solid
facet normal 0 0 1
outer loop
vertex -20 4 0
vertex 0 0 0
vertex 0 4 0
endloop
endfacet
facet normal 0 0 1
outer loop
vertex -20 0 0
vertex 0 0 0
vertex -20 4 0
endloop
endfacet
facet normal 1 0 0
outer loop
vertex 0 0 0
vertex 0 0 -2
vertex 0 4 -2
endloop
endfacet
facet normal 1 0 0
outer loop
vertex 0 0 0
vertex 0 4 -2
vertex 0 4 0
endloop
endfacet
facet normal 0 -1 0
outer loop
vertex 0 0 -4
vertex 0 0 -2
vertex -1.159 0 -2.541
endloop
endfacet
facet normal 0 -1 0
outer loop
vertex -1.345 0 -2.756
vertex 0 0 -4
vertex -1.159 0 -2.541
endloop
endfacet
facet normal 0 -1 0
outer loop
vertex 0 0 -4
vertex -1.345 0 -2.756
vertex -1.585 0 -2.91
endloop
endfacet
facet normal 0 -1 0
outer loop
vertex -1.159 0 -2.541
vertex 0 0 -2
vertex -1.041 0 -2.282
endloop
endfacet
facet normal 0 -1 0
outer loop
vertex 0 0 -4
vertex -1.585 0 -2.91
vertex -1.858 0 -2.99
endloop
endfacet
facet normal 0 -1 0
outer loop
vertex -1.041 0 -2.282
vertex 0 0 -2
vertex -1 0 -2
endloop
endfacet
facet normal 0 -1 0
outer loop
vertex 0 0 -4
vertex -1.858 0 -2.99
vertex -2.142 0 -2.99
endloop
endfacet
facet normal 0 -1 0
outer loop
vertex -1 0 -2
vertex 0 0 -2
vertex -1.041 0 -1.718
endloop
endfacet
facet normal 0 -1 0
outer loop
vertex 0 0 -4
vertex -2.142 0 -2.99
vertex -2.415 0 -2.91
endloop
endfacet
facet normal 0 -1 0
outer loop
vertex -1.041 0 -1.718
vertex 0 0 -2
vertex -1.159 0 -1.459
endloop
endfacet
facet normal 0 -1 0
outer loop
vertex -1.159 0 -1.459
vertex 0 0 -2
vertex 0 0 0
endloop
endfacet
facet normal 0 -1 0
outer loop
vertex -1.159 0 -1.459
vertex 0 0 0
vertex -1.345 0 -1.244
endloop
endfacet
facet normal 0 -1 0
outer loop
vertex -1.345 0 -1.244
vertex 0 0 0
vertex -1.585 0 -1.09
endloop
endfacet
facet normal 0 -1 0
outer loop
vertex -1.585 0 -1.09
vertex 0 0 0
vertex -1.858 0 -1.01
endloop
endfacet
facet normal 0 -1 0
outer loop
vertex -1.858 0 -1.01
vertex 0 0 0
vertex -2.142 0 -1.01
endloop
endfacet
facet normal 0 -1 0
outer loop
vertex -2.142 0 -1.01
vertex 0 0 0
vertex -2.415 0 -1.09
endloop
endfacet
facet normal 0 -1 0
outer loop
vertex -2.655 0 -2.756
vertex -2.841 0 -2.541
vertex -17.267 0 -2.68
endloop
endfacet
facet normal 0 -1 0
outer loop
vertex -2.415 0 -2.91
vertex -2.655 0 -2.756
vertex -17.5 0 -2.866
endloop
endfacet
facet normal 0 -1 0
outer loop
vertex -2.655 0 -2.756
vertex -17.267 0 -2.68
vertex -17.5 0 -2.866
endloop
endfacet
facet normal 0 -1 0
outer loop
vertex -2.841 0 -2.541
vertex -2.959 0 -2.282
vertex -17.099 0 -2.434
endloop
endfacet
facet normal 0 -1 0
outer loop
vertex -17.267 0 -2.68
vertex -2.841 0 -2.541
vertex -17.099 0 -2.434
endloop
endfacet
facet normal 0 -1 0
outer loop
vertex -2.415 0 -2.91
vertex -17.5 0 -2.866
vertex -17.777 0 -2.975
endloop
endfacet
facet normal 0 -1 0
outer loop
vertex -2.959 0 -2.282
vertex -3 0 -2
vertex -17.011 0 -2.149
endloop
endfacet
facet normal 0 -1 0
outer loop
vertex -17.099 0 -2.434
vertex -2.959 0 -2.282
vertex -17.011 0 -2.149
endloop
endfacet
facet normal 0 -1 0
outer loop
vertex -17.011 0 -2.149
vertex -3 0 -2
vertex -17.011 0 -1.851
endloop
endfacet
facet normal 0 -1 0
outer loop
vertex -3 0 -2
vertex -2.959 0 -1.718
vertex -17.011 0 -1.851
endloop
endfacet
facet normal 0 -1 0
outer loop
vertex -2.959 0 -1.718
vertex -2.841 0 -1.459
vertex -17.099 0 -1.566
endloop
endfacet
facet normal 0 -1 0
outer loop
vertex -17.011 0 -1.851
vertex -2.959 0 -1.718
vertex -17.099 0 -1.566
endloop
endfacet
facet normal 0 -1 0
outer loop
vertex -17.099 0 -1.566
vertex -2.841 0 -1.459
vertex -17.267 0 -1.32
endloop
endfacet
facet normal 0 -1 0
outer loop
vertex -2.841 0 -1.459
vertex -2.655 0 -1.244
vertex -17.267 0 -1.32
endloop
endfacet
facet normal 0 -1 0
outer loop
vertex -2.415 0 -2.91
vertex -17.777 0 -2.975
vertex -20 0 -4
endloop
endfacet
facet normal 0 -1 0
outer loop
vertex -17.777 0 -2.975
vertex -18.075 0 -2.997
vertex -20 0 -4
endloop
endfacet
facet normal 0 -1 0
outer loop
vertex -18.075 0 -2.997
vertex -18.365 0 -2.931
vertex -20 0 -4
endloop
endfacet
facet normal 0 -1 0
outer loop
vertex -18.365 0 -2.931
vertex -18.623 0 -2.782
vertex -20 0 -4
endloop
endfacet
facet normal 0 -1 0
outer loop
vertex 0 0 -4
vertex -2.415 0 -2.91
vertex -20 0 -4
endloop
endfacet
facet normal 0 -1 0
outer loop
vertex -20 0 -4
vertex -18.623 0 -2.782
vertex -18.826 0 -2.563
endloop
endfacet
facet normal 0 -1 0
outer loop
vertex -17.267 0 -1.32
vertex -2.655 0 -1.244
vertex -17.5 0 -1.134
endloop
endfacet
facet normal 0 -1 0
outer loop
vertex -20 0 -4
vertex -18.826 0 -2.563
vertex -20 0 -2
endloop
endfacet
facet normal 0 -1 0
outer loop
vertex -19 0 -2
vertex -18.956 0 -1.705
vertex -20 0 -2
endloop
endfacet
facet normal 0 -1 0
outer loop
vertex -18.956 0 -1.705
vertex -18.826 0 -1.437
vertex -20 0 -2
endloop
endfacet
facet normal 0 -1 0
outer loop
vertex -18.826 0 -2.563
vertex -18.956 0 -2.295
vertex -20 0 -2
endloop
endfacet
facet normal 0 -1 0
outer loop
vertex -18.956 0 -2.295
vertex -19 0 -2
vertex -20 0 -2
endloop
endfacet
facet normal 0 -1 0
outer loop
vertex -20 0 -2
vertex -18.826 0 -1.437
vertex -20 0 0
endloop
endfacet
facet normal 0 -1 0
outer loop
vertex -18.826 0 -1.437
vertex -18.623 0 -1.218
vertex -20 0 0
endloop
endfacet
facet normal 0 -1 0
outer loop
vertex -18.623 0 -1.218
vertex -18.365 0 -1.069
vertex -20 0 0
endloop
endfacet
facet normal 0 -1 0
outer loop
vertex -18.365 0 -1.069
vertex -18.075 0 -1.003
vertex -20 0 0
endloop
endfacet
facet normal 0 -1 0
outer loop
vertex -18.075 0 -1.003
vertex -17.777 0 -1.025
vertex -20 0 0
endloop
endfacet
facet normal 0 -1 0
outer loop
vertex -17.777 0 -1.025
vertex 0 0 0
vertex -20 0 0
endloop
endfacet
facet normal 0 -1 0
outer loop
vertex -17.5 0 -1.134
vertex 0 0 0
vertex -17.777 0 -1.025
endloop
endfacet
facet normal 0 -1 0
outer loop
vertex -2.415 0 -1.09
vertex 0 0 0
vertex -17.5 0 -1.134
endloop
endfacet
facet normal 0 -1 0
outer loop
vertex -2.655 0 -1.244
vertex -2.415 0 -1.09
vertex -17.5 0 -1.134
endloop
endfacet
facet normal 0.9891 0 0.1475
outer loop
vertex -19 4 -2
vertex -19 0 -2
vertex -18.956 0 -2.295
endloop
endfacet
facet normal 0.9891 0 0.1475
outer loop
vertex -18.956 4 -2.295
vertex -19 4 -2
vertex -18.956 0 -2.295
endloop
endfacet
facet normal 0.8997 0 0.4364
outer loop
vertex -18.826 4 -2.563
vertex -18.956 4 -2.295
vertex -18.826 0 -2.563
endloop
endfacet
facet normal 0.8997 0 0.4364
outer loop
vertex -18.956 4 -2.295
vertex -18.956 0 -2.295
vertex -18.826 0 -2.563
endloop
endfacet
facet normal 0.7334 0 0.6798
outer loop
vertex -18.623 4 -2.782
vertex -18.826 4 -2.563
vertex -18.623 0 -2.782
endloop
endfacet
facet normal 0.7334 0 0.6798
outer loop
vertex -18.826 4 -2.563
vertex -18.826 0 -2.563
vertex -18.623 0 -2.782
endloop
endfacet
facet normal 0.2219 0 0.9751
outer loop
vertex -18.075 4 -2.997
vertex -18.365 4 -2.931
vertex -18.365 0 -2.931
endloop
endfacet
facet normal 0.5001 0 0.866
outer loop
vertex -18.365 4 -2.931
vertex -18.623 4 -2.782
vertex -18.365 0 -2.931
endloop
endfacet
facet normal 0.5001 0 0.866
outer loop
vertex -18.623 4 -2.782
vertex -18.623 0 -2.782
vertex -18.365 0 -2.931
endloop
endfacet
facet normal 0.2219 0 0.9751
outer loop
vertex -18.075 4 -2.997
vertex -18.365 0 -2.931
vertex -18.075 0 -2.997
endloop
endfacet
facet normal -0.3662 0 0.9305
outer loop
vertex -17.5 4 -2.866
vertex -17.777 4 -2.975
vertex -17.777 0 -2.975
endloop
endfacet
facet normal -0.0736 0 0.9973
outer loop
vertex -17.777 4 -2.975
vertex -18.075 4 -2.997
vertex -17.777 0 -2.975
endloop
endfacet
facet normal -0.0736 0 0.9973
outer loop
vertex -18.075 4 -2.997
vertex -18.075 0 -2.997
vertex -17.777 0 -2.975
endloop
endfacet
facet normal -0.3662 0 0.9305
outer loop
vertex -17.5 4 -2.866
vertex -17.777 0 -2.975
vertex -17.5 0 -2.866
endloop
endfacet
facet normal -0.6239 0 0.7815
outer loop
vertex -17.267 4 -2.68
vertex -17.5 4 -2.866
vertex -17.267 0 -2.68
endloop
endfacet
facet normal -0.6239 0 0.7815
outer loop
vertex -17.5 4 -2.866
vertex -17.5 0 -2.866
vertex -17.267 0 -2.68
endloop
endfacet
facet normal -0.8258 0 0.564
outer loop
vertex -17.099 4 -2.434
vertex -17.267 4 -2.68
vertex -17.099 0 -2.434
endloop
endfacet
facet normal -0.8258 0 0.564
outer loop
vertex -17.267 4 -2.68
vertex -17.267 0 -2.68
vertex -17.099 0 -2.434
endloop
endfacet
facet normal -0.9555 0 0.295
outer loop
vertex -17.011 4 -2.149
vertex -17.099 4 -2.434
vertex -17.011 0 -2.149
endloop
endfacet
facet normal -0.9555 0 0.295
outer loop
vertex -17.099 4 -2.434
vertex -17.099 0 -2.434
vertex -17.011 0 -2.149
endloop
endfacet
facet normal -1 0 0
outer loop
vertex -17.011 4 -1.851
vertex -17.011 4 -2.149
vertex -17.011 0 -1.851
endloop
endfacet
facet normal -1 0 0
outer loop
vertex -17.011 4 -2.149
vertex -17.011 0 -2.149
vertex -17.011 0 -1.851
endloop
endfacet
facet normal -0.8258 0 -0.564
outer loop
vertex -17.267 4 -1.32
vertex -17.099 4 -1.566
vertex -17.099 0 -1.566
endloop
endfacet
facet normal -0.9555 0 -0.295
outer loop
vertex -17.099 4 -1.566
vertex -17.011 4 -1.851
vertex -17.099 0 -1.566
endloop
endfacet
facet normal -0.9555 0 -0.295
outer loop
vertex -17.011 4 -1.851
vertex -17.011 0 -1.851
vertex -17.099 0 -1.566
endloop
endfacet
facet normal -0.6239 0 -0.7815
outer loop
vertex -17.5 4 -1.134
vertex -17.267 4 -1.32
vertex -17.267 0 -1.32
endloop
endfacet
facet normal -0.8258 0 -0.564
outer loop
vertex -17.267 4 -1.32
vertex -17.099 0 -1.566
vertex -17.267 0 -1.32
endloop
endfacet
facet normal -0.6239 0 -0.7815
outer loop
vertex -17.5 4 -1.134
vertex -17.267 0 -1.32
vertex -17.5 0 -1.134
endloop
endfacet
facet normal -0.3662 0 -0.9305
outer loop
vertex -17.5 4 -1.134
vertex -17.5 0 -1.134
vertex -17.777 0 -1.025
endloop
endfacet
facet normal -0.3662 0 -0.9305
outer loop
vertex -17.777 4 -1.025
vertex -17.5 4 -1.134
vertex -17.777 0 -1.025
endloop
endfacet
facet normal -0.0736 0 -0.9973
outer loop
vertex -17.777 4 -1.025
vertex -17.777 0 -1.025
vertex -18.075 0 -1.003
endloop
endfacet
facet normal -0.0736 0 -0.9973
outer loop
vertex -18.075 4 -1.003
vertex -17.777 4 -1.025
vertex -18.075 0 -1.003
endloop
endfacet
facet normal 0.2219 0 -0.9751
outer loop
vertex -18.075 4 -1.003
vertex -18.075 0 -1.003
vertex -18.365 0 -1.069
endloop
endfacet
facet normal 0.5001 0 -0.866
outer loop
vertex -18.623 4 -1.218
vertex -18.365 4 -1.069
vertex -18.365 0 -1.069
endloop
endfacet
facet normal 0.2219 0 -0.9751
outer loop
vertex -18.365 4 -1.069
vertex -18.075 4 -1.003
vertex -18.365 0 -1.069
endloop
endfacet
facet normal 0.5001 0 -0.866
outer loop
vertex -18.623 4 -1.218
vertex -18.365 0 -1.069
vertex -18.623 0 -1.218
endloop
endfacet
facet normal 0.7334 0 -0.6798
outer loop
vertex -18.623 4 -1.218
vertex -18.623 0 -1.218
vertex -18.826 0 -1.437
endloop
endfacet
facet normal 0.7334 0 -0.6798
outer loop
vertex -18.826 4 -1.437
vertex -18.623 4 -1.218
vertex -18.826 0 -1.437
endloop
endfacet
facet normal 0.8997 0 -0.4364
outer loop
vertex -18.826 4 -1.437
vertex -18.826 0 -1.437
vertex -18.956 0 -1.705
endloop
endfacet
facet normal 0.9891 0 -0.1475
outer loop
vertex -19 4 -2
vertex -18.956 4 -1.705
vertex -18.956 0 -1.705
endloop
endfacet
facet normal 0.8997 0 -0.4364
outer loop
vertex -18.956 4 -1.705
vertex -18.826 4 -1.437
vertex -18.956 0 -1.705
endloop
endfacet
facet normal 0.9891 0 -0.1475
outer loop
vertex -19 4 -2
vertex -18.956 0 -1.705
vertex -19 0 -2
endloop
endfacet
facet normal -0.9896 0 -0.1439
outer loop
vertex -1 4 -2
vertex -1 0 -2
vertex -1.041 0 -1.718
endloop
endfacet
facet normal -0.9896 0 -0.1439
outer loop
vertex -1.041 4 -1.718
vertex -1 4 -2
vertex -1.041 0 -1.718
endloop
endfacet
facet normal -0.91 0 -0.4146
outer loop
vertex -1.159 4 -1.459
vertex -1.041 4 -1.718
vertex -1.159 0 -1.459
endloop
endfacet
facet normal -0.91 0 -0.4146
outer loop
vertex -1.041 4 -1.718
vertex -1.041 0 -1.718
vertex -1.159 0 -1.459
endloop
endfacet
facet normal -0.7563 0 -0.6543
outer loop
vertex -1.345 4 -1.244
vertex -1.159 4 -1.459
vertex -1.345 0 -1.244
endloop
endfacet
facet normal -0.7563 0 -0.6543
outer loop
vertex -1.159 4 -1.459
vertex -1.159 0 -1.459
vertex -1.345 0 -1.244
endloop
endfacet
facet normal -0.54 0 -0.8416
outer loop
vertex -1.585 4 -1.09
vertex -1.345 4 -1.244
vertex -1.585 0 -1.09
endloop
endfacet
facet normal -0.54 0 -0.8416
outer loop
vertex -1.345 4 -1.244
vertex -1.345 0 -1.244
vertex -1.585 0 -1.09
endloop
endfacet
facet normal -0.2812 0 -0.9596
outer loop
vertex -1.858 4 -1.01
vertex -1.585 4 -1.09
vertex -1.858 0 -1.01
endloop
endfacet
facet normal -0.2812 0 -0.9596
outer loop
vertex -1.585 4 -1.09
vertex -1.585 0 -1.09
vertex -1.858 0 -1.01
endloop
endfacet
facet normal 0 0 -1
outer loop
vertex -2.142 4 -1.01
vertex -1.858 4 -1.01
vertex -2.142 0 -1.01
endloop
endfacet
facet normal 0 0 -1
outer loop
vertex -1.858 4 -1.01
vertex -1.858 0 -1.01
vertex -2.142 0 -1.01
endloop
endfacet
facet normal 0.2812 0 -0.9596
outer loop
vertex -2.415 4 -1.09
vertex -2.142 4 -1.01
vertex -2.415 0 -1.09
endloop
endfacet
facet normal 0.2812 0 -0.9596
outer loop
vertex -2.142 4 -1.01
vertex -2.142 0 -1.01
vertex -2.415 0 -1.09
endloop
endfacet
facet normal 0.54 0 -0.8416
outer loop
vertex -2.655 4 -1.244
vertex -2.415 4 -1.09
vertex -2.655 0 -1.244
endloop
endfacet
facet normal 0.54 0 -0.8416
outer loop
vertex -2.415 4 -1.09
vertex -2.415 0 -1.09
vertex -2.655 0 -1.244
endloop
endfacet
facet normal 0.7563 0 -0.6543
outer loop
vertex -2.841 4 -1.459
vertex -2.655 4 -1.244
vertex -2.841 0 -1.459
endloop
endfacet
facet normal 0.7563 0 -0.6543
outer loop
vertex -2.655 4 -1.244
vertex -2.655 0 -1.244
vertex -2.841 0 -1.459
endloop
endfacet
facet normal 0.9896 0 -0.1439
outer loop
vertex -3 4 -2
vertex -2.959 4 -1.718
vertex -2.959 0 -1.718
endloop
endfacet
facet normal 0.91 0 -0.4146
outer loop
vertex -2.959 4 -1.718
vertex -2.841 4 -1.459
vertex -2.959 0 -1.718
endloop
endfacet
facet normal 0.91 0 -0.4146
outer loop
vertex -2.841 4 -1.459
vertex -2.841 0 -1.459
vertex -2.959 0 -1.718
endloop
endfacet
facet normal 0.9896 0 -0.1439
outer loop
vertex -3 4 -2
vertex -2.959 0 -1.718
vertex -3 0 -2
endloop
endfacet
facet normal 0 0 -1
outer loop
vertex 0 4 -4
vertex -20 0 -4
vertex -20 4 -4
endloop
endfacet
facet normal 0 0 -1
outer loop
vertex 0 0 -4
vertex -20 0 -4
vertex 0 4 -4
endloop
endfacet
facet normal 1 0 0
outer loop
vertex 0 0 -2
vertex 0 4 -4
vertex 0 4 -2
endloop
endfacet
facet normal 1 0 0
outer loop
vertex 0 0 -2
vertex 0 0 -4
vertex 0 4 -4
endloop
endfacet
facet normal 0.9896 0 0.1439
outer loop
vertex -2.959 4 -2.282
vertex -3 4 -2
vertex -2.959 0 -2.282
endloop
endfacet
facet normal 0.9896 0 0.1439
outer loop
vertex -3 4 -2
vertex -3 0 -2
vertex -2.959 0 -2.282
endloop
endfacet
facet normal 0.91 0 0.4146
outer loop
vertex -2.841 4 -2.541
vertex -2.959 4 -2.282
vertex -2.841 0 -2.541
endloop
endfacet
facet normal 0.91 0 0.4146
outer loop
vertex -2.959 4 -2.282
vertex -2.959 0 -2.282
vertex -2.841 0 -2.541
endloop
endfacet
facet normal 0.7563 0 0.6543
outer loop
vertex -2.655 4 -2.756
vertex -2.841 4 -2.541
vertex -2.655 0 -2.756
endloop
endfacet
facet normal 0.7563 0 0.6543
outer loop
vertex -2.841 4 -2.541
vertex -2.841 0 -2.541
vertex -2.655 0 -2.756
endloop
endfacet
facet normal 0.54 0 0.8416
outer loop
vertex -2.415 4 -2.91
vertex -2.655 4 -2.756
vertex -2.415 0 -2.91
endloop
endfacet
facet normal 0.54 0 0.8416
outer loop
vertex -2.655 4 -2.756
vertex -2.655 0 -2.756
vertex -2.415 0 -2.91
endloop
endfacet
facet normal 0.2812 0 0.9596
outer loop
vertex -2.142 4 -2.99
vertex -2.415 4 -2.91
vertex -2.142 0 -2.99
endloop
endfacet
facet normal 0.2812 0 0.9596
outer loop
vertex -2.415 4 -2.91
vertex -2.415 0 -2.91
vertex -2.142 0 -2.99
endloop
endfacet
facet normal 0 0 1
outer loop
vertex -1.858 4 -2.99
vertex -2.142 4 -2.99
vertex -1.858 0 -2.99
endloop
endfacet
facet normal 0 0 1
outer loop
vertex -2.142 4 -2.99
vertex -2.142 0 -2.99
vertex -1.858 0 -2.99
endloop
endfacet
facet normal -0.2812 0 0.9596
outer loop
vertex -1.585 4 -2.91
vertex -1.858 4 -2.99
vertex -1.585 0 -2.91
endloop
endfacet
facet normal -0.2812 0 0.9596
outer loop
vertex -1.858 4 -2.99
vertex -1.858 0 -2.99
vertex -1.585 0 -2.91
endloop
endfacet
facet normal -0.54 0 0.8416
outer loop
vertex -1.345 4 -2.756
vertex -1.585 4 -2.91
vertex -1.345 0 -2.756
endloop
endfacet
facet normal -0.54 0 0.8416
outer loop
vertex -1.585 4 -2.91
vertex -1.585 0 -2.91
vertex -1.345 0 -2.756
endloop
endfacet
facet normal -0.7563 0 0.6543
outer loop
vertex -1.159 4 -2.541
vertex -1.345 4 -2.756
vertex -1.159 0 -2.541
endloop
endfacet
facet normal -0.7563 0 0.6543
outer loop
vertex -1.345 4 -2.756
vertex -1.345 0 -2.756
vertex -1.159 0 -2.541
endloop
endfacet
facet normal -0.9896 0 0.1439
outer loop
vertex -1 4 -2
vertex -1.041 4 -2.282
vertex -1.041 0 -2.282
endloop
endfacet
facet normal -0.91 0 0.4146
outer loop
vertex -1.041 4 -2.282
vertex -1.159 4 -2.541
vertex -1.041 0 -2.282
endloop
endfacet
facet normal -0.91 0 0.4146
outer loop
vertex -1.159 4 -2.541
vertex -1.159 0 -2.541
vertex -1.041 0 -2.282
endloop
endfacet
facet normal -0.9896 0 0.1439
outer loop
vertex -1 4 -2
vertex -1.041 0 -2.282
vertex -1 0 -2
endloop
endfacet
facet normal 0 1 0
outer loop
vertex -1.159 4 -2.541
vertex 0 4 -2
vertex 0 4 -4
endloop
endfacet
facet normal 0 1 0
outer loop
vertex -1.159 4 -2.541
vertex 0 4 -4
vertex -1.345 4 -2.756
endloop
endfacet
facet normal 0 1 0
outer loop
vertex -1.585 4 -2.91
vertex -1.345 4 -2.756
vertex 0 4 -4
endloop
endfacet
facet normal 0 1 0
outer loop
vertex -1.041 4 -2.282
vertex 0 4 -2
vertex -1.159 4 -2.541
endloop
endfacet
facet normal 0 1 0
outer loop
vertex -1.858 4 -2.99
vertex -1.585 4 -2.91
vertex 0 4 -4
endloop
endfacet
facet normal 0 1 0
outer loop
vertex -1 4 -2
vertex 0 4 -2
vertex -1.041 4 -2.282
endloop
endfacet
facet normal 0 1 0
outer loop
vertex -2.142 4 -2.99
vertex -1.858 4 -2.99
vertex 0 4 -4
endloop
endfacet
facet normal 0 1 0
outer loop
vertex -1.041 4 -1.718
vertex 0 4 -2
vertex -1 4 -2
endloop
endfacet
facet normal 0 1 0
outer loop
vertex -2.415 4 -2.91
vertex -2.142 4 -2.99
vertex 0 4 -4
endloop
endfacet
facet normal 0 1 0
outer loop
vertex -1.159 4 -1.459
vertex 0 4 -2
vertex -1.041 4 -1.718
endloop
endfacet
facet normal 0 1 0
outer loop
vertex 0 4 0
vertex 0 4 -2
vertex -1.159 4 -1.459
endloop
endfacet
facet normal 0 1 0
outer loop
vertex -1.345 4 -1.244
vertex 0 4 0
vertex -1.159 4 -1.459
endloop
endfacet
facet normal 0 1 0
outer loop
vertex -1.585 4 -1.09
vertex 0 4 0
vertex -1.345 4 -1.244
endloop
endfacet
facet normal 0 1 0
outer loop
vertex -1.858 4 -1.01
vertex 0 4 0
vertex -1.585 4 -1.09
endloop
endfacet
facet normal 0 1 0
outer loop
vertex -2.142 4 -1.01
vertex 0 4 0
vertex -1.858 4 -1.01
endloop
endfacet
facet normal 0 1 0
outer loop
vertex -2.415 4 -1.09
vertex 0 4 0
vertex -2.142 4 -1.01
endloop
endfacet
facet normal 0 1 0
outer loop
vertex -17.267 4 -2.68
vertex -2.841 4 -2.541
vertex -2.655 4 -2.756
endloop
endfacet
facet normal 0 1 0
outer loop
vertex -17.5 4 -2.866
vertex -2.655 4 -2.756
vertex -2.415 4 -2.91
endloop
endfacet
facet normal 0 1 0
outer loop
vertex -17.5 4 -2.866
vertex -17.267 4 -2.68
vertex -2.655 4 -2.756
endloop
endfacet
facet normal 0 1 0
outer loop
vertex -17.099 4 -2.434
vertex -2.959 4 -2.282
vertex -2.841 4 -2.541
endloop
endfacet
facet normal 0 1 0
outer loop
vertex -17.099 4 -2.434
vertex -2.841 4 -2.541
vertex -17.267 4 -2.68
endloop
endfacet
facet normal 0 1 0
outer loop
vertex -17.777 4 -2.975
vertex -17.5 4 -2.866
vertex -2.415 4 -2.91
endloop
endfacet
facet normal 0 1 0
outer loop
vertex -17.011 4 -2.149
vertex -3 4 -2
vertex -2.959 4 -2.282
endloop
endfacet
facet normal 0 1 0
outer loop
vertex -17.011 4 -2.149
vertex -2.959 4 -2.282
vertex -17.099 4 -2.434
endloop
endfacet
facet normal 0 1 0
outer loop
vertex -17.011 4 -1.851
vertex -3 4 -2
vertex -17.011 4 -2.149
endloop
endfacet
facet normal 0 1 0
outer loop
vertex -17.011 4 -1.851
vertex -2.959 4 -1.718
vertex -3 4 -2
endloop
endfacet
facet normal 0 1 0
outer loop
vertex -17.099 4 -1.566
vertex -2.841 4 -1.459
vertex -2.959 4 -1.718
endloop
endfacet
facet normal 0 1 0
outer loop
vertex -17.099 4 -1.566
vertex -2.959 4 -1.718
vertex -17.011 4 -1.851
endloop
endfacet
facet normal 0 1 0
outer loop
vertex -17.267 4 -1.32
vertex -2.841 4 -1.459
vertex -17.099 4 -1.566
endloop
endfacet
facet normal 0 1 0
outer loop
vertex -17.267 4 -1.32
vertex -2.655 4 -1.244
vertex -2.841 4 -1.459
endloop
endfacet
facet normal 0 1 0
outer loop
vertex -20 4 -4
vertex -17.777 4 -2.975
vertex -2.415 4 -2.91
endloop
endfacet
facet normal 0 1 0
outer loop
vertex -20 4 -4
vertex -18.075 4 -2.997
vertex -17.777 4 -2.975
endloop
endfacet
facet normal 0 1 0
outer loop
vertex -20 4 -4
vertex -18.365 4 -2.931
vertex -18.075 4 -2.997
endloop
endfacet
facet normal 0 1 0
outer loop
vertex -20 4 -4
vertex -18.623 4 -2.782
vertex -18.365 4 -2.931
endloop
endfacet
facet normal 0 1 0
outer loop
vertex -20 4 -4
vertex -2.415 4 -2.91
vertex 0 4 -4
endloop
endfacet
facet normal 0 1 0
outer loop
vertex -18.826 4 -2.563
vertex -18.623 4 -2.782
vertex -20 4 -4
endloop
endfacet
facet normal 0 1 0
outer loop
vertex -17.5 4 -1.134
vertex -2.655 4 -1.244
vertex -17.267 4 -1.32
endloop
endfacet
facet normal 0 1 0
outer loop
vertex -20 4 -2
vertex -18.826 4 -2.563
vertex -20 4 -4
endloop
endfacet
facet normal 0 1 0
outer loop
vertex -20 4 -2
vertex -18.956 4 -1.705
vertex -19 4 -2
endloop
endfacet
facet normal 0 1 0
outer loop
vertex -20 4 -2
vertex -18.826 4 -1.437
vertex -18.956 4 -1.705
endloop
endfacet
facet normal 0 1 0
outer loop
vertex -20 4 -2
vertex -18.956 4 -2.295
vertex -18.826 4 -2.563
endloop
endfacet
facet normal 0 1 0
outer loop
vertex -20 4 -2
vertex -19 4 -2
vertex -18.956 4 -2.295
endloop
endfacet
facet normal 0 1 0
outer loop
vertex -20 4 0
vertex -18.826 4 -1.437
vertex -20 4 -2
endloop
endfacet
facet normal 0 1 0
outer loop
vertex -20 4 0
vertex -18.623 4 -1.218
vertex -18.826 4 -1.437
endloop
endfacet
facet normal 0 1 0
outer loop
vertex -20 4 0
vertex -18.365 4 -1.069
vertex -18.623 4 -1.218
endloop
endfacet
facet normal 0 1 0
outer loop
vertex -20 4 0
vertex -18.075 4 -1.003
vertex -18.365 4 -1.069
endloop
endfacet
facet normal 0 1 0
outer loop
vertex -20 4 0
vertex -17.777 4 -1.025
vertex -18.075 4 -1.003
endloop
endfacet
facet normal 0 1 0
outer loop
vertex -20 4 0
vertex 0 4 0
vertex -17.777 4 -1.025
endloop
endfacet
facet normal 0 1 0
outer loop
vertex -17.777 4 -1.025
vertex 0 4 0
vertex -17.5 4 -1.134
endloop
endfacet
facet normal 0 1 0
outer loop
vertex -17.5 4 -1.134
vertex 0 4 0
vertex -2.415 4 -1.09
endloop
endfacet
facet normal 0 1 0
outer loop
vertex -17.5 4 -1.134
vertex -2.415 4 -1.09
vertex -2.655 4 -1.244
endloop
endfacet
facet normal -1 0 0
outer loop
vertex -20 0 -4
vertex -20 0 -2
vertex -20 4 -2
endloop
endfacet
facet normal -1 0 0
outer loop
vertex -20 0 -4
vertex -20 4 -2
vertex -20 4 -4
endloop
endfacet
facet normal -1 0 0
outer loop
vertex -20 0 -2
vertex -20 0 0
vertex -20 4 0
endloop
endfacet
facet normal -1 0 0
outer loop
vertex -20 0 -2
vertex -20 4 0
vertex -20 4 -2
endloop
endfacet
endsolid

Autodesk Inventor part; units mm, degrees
ref_plane "YZ Plane" through (0, 0, 0) normal (1, 0, 0) x (0, 1, 0)
ref_plane "XZ Plane" through (0, 0, 0) normal (0, 1, 0) x (-1, 0, 0)
ref_plane "XY Plane" through (0, 0, 0) normal (0, 0, 1) x (1, 0, 0)
sketch "Sketch1" plane through (0, 0, 0) normal (0, 1, 0) x (-1, 0, 0)
  line L0 (0, 0) -> (20, 0)
  line L1 (20, 0) -> (20, -4)
  line L2 (20, -4) -> (0, -4)
  line L3 (0, -4) -> (0, 0)
  line L4 (0, -2) -> (2, -2)
  line L5 (20, -2) -> (18, -2)
  circle A0 centre (18, -2) radius 1
  circle A1 centre (2, -2) radius 1
  dimension "d0" = 20
  dimension "d1" = 4
  dimension "d2" = 2
  dimension "d3" = 2
  dimension "d4" = 2
  dimension "d5" = 2
extrude "Extrusion1" add sketch "Sketch1" along normal blind 4
properties part number "parallel_bar_short_v1"
